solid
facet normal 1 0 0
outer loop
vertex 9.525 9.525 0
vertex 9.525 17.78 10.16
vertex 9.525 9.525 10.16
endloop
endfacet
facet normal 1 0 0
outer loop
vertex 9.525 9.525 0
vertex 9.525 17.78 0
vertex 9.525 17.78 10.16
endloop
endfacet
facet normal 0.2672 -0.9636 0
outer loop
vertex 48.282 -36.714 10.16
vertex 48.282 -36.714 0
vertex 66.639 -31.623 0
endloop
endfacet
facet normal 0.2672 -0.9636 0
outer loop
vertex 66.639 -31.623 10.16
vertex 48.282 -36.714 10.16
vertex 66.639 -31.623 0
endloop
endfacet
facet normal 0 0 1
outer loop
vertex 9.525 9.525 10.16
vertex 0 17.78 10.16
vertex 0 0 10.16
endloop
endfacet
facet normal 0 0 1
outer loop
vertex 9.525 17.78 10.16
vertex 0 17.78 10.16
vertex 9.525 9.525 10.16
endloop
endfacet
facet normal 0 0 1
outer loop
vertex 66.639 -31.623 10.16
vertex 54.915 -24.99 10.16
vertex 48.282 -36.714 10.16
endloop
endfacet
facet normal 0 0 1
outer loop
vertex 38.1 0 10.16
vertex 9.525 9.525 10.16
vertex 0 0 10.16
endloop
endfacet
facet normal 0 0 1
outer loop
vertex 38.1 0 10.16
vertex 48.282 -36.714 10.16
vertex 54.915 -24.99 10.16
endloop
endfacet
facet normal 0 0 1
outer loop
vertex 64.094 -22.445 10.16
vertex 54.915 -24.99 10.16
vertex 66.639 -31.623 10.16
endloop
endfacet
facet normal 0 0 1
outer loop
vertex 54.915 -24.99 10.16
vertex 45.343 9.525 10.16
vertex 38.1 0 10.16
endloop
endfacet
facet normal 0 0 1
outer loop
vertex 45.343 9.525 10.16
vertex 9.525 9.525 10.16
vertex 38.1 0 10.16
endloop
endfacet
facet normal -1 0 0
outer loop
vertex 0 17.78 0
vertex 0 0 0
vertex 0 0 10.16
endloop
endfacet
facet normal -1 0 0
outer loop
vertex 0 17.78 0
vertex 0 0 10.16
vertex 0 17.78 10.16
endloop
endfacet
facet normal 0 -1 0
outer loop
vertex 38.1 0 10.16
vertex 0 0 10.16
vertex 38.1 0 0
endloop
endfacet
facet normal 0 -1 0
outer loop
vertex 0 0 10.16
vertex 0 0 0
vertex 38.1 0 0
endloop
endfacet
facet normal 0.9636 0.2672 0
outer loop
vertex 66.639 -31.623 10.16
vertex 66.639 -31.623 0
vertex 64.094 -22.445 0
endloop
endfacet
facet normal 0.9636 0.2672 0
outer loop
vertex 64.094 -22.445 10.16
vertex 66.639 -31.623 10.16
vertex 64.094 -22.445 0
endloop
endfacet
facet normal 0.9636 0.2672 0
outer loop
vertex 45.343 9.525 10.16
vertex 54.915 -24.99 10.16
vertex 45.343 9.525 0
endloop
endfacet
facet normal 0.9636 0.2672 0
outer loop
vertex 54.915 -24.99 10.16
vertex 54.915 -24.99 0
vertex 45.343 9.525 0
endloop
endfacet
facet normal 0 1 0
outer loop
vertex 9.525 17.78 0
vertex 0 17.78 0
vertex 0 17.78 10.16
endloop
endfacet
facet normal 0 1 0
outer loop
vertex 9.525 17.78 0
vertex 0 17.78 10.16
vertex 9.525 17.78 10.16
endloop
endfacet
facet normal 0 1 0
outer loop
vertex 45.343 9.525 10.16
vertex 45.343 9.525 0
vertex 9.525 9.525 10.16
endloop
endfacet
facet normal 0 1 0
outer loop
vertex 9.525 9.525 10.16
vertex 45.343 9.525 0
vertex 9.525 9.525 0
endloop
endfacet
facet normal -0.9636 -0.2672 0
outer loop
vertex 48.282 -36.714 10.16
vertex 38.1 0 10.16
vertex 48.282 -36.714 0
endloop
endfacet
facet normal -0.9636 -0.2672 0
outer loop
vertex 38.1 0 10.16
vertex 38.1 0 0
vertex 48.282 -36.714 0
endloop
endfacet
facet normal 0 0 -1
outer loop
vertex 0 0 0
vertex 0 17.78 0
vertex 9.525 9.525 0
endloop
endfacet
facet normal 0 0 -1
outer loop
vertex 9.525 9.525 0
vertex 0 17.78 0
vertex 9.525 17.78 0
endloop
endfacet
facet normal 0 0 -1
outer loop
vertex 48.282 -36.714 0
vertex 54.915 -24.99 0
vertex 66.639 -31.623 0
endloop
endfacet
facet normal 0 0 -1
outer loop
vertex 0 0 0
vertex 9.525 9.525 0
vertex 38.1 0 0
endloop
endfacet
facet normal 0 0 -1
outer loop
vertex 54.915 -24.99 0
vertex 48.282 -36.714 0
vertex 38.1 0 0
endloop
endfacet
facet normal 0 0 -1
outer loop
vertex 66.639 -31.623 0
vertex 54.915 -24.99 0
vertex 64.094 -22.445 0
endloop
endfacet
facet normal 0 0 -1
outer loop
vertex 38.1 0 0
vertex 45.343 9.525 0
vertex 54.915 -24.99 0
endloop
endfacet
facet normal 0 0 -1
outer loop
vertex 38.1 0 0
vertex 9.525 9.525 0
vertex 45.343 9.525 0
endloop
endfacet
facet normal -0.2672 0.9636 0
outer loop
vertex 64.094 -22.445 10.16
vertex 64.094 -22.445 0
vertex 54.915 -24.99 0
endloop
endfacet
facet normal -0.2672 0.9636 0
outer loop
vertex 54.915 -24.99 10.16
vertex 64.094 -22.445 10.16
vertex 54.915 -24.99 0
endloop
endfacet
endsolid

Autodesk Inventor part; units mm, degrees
ref_plane "YZ Plane" through (0, 0, 0) normal (1, 0, 0) x (0, 1, 0)
ref_plane "XZ Plane" through (0, 0, 0) normal (0, 1, 0) x (-1, 0, 0)
ref_plane "XY Plane" through (0, 0, 0) normal (0, 0, 1) x (1, 0, 0)
sketch "Sketch1" plane through (0, 0, 0) normal (0, 0, 1) x (1, 0, 0)
  line L0 (0, 0) -> (38.1, 0)
  line L1 (38.1, 0) -> (48.2818, -36.7143)
  line L2 (38.1, 0) -> (76.2, 0) construction
  line L3 (45.343, 9.525) -> (9.525, 9.525)
  line L4 (0, 0) -> (0, 17.78)
  line L5 (0, 17.78) -> (9.525, 17.78)
  line L6 (9.525, 17.78) -> (9.525, 9.525)
  line L7 (0, 9.525) -> (9.525, 9.525)
  line L8 (45.343, 9.525) -> (38.1, 0)
  line L9 (48.2818, -36.7143) -> (66.6389, -31.6234)
  line L10 (66.6389, -31.6234) -> (64.0935, -22.4448)
  line L11 (64.0935, -22.4448) -> (54.9149, -24.9903)
  line L12 (54.9149, -24.9903) -> (45.343, 9.525)
  dimension "d0" = 38.1
  dimension "d1" = 38.1
  dimension "d2" = 74.5
  dimension "d9" = 17.78
  dimension "d10" = 9.525
  dimension "d11" = 9.525
  dimension "d12" = 19.05
  dimension "d13" = 9.525
  dimension "d14" = 9.525
extrude "Extrusion1" add sketch "Sketch1" along normal blind 10.16
properties part number "AttachmentPlateHopper_v2"
